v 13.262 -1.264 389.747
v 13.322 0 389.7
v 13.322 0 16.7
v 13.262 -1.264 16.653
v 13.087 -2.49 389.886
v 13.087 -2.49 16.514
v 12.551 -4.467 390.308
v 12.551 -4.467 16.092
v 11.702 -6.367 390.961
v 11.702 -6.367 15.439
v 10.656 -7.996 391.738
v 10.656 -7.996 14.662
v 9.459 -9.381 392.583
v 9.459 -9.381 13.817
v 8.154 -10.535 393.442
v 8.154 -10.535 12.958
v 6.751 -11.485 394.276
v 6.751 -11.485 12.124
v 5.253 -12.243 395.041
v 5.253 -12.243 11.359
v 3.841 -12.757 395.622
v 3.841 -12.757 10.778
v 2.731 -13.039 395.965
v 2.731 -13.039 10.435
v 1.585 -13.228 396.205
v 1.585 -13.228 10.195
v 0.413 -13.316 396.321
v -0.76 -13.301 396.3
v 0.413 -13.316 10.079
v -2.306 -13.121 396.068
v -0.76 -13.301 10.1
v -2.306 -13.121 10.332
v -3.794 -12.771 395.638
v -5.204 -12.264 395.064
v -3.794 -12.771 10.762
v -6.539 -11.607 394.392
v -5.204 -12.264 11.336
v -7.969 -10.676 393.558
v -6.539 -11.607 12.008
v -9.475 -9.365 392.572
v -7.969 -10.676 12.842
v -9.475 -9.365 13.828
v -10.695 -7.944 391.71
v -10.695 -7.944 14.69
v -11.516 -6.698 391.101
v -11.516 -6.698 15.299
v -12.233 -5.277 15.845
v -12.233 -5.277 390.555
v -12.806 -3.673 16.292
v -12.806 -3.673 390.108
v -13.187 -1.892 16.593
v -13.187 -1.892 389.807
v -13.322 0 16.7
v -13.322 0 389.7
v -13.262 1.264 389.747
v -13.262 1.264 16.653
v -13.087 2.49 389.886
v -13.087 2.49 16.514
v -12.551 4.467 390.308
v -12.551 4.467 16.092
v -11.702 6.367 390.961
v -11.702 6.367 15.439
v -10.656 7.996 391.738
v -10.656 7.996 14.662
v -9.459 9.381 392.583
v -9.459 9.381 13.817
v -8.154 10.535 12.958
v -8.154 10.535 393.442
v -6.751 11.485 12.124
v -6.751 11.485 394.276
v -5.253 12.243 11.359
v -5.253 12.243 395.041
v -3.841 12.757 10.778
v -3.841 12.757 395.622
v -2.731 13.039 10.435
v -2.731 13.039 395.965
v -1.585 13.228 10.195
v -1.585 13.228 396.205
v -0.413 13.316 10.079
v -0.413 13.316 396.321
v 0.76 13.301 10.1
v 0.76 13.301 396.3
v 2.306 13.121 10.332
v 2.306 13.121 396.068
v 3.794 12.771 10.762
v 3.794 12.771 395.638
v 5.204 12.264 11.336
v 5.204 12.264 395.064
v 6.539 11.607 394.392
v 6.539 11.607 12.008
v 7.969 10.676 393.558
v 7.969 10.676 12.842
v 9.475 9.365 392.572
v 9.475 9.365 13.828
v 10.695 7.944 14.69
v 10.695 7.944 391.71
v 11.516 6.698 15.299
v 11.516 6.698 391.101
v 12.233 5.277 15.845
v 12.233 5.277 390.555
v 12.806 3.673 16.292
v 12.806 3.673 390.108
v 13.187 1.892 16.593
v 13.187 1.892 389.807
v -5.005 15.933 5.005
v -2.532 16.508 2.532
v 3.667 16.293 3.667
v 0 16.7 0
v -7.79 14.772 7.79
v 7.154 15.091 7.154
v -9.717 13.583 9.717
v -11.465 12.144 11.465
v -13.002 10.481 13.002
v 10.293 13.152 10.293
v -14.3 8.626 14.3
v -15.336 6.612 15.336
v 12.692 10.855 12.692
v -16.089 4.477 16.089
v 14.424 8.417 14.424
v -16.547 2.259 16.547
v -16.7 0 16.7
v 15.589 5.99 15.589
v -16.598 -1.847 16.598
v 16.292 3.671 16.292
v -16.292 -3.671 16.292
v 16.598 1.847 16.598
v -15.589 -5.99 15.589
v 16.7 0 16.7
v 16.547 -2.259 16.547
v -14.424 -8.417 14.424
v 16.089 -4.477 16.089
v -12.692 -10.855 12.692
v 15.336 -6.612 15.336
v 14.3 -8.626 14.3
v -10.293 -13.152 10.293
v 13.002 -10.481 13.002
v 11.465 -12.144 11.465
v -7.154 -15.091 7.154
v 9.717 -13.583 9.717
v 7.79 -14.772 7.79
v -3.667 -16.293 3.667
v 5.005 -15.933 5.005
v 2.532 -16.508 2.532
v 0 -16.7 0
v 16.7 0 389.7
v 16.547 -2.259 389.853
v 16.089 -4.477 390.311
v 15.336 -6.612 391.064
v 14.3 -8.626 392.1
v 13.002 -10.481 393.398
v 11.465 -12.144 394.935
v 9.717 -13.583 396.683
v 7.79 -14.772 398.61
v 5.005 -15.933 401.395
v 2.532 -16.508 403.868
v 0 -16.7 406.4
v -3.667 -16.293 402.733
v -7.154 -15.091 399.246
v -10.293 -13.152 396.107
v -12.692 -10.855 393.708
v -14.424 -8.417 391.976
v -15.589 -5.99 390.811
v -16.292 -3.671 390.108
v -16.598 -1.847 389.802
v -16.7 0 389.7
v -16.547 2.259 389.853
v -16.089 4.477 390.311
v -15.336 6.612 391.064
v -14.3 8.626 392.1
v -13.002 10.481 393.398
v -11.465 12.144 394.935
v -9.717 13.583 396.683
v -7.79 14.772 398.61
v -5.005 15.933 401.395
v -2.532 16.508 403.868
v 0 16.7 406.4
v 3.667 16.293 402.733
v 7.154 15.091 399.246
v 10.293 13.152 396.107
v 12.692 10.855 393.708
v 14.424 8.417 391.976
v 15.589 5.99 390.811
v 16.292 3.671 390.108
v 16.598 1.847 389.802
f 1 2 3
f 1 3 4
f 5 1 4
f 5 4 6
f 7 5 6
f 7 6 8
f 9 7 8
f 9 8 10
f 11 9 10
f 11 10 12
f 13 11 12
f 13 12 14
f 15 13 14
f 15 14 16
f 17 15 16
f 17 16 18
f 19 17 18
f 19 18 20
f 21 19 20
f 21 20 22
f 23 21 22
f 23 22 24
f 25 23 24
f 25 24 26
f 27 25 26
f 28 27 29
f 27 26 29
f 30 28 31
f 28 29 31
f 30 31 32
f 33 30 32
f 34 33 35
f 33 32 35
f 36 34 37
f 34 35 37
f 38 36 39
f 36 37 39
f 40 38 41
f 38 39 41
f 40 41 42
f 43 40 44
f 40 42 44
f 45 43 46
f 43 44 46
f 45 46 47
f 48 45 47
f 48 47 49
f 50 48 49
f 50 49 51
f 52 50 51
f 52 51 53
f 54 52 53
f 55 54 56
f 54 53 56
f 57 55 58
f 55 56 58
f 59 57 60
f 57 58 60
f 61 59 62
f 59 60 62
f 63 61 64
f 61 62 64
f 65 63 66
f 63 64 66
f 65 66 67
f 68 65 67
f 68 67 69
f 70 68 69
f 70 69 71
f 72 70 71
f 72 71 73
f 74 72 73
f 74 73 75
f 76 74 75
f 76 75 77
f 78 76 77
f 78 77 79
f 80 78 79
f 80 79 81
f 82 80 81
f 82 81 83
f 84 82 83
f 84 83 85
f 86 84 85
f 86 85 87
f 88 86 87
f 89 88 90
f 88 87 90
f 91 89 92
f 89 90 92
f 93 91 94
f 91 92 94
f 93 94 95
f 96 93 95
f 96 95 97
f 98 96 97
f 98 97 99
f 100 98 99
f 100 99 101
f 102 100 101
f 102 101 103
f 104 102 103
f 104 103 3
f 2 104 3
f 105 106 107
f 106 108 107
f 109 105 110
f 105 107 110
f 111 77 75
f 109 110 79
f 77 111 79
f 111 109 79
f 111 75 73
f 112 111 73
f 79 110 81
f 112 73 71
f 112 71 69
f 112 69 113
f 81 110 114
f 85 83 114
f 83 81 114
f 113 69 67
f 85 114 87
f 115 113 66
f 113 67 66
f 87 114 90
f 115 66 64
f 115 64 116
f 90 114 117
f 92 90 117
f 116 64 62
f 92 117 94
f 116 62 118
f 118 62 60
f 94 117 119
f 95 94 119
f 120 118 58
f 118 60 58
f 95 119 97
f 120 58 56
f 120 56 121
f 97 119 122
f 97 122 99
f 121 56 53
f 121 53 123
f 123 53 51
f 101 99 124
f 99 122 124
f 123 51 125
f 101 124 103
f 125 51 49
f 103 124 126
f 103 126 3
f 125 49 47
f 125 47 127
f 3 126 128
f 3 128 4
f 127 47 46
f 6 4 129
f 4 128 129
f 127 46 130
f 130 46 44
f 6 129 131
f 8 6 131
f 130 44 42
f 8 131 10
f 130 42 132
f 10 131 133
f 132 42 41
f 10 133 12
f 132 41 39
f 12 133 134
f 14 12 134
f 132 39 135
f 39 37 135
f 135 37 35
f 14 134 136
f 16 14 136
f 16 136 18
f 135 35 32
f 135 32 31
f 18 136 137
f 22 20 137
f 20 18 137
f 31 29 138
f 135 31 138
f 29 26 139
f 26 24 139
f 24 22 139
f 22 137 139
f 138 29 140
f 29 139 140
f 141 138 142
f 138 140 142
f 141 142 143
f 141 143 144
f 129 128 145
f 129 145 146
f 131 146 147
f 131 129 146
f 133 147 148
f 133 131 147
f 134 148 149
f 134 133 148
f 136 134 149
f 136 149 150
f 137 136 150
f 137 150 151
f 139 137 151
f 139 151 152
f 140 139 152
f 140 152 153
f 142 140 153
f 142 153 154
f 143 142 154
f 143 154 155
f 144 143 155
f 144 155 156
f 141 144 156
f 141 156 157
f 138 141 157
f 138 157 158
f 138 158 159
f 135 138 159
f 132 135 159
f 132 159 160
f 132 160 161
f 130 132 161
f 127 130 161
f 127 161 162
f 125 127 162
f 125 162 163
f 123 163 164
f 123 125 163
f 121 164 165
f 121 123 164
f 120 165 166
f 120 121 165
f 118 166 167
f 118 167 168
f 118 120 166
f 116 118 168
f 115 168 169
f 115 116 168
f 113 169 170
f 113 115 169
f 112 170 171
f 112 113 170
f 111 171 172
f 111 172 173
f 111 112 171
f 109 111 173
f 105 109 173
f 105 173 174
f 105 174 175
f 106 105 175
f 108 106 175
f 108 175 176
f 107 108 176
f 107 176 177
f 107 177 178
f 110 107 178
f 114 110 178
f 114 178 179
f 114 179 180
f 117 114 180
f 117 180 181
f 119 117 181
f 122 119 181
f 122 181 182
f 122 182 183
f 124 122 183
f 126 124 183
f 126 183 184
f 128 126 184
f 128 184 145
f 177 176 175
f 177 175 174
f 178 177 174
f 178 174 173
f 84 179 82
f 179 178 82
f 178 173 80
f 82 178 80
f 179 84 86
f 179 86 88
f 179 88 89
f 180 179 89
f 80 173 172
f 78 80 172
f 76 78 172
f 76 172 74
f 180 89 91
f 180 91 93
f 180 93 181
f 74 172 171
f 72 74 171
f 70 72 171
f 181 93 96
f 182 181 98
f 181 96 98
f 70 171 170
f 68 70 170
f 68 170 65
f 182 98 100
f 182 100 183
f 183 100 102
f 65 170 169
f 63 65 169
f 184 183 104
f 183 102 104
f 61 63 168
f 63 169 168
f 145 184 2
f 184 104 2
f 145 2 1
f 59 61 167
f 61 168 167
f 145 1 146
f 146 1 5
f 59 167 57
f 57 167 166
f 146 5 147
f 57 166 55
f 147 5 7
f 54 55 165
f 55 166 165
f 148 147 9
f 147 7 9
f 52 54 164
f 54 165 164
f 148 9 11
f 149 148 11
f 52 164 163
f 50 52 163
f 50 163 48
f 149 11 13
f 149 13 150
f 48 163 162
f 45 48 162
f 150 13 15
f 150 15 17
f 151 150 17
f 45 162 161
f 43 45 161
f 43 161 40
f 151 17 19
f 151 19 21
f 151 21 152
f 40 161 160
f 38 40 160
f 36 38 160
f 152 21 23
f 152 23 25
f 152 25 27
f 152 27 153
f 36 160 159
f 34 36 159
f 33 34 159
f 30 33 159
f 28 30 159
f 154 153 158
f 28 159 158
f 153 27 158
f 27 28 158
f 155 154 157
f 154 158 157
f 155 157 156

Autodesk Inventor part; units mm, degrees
ref_plane "Start plane" through (0, 0, 0) normal (0, 0, 1) x (1, 0, 0)
ref_plane "End plane" through (0, 0, 406.4) normal (0, 0, 1) x (1, 0, 0)
sketch "Sketch" plane through (0, 0, 0) normal (0, 0, 1) x (1, 0, 0)
  circle A0 centre (0, 0) radius 13.3223
  circle A1 centre (0, 0) radius 16.7005
  dimension "d0" = 33.401
  dimension "d1" = 3.3782
extrude "Body" add sketch "Sketch" along normal up to surface (406.4 mm away) from surface at 0
sketch "Sketch3" plane through (0, 0, 0) normal (0, 0, 1) x (1, 0, 0)
  line L0 (0, 0) -> (10, 0)
ref_plane "Work Plane3" through (0, 0, 0) normal (0, -1, 0) x (1, 0, 0)
sketch "Sketch4" plane through (0, 0, 0) normal (0, -1, 0) x (1, 0, 0)
  line L0 (-2, 0) -> (12, 0)
  line L1 (-2, 406.4) -> (12, 406.4)
  dimension "d7" = 406.4
ref_plane "Work Plane4" through (444.5, 0, 0) normal (-1, 0, 0) x (0, 0, 1)
ref_plane "Work Plane5" through (-355.6, 0, 0) normal (-1, 0, 0) x (0, 0, 1)
ref_plane "Work Plane6" through (44.45, 0, 0) normal (-1, 0, 0) x (0, 0, 1)
sketch "Sketch5" plane through (44.45, 0, 0) normal (-1, 0, 0) x (0, 0, 1)
  circle A0 centre (0, 0) radius 16.7005
  circle A1 centre (0, 0) radius 13.3223
extrude "Extrusion2" cut sketch "Sketch5" along normal up to surface (800.1 mm away) from surface at -400.05 contours A0 | A1
ref_plane "Work Plane7" through (-355.6, 0, 406.4) normal (1, 0, 0) x (0, 0, -1)
ref_plane "Work Plane8" through (444.5, 0, 406.4) normal (1, 0, 0) x (0, 0, -1)
ref_plane "Work Plane9" through (44.45, 0, 406.4) normal (1, 0, 0) x (0, 0, -1)
sketch "Sketch6" plane through (44.45, 0, 406.4) normal (1, 0, 0) x (0, 0, -1)
  circle A0 centre (0, 0) radius 16.7005
  circle A1 centre (0, 0) radius 13.3223
extrude "Extrusion3" cut sketch "Sketch6" along normal up to surface (800.1 mm away) from surface at -400.05 contours A0 | A1
equation "\"d0\" = G_H"
equation "\"d1\" = G_T"
equation "\"d2\" = G_L"
equation "\"G_H\" = 33.401"
equation "\"G_T\" = 3.3782"
equation "\"G_L\" = d7"
equation "\"G_OFFSET_START\" = 0"
equation "\"G_OFFSET_END\" = 0"
equation "\"d5\" = G_OFFSET_END + B_L"
equation "\"B_L\" = 406.4"
properties part number "ANSI - 1 x 0.133 - 16" material "Aluminum 6061"
